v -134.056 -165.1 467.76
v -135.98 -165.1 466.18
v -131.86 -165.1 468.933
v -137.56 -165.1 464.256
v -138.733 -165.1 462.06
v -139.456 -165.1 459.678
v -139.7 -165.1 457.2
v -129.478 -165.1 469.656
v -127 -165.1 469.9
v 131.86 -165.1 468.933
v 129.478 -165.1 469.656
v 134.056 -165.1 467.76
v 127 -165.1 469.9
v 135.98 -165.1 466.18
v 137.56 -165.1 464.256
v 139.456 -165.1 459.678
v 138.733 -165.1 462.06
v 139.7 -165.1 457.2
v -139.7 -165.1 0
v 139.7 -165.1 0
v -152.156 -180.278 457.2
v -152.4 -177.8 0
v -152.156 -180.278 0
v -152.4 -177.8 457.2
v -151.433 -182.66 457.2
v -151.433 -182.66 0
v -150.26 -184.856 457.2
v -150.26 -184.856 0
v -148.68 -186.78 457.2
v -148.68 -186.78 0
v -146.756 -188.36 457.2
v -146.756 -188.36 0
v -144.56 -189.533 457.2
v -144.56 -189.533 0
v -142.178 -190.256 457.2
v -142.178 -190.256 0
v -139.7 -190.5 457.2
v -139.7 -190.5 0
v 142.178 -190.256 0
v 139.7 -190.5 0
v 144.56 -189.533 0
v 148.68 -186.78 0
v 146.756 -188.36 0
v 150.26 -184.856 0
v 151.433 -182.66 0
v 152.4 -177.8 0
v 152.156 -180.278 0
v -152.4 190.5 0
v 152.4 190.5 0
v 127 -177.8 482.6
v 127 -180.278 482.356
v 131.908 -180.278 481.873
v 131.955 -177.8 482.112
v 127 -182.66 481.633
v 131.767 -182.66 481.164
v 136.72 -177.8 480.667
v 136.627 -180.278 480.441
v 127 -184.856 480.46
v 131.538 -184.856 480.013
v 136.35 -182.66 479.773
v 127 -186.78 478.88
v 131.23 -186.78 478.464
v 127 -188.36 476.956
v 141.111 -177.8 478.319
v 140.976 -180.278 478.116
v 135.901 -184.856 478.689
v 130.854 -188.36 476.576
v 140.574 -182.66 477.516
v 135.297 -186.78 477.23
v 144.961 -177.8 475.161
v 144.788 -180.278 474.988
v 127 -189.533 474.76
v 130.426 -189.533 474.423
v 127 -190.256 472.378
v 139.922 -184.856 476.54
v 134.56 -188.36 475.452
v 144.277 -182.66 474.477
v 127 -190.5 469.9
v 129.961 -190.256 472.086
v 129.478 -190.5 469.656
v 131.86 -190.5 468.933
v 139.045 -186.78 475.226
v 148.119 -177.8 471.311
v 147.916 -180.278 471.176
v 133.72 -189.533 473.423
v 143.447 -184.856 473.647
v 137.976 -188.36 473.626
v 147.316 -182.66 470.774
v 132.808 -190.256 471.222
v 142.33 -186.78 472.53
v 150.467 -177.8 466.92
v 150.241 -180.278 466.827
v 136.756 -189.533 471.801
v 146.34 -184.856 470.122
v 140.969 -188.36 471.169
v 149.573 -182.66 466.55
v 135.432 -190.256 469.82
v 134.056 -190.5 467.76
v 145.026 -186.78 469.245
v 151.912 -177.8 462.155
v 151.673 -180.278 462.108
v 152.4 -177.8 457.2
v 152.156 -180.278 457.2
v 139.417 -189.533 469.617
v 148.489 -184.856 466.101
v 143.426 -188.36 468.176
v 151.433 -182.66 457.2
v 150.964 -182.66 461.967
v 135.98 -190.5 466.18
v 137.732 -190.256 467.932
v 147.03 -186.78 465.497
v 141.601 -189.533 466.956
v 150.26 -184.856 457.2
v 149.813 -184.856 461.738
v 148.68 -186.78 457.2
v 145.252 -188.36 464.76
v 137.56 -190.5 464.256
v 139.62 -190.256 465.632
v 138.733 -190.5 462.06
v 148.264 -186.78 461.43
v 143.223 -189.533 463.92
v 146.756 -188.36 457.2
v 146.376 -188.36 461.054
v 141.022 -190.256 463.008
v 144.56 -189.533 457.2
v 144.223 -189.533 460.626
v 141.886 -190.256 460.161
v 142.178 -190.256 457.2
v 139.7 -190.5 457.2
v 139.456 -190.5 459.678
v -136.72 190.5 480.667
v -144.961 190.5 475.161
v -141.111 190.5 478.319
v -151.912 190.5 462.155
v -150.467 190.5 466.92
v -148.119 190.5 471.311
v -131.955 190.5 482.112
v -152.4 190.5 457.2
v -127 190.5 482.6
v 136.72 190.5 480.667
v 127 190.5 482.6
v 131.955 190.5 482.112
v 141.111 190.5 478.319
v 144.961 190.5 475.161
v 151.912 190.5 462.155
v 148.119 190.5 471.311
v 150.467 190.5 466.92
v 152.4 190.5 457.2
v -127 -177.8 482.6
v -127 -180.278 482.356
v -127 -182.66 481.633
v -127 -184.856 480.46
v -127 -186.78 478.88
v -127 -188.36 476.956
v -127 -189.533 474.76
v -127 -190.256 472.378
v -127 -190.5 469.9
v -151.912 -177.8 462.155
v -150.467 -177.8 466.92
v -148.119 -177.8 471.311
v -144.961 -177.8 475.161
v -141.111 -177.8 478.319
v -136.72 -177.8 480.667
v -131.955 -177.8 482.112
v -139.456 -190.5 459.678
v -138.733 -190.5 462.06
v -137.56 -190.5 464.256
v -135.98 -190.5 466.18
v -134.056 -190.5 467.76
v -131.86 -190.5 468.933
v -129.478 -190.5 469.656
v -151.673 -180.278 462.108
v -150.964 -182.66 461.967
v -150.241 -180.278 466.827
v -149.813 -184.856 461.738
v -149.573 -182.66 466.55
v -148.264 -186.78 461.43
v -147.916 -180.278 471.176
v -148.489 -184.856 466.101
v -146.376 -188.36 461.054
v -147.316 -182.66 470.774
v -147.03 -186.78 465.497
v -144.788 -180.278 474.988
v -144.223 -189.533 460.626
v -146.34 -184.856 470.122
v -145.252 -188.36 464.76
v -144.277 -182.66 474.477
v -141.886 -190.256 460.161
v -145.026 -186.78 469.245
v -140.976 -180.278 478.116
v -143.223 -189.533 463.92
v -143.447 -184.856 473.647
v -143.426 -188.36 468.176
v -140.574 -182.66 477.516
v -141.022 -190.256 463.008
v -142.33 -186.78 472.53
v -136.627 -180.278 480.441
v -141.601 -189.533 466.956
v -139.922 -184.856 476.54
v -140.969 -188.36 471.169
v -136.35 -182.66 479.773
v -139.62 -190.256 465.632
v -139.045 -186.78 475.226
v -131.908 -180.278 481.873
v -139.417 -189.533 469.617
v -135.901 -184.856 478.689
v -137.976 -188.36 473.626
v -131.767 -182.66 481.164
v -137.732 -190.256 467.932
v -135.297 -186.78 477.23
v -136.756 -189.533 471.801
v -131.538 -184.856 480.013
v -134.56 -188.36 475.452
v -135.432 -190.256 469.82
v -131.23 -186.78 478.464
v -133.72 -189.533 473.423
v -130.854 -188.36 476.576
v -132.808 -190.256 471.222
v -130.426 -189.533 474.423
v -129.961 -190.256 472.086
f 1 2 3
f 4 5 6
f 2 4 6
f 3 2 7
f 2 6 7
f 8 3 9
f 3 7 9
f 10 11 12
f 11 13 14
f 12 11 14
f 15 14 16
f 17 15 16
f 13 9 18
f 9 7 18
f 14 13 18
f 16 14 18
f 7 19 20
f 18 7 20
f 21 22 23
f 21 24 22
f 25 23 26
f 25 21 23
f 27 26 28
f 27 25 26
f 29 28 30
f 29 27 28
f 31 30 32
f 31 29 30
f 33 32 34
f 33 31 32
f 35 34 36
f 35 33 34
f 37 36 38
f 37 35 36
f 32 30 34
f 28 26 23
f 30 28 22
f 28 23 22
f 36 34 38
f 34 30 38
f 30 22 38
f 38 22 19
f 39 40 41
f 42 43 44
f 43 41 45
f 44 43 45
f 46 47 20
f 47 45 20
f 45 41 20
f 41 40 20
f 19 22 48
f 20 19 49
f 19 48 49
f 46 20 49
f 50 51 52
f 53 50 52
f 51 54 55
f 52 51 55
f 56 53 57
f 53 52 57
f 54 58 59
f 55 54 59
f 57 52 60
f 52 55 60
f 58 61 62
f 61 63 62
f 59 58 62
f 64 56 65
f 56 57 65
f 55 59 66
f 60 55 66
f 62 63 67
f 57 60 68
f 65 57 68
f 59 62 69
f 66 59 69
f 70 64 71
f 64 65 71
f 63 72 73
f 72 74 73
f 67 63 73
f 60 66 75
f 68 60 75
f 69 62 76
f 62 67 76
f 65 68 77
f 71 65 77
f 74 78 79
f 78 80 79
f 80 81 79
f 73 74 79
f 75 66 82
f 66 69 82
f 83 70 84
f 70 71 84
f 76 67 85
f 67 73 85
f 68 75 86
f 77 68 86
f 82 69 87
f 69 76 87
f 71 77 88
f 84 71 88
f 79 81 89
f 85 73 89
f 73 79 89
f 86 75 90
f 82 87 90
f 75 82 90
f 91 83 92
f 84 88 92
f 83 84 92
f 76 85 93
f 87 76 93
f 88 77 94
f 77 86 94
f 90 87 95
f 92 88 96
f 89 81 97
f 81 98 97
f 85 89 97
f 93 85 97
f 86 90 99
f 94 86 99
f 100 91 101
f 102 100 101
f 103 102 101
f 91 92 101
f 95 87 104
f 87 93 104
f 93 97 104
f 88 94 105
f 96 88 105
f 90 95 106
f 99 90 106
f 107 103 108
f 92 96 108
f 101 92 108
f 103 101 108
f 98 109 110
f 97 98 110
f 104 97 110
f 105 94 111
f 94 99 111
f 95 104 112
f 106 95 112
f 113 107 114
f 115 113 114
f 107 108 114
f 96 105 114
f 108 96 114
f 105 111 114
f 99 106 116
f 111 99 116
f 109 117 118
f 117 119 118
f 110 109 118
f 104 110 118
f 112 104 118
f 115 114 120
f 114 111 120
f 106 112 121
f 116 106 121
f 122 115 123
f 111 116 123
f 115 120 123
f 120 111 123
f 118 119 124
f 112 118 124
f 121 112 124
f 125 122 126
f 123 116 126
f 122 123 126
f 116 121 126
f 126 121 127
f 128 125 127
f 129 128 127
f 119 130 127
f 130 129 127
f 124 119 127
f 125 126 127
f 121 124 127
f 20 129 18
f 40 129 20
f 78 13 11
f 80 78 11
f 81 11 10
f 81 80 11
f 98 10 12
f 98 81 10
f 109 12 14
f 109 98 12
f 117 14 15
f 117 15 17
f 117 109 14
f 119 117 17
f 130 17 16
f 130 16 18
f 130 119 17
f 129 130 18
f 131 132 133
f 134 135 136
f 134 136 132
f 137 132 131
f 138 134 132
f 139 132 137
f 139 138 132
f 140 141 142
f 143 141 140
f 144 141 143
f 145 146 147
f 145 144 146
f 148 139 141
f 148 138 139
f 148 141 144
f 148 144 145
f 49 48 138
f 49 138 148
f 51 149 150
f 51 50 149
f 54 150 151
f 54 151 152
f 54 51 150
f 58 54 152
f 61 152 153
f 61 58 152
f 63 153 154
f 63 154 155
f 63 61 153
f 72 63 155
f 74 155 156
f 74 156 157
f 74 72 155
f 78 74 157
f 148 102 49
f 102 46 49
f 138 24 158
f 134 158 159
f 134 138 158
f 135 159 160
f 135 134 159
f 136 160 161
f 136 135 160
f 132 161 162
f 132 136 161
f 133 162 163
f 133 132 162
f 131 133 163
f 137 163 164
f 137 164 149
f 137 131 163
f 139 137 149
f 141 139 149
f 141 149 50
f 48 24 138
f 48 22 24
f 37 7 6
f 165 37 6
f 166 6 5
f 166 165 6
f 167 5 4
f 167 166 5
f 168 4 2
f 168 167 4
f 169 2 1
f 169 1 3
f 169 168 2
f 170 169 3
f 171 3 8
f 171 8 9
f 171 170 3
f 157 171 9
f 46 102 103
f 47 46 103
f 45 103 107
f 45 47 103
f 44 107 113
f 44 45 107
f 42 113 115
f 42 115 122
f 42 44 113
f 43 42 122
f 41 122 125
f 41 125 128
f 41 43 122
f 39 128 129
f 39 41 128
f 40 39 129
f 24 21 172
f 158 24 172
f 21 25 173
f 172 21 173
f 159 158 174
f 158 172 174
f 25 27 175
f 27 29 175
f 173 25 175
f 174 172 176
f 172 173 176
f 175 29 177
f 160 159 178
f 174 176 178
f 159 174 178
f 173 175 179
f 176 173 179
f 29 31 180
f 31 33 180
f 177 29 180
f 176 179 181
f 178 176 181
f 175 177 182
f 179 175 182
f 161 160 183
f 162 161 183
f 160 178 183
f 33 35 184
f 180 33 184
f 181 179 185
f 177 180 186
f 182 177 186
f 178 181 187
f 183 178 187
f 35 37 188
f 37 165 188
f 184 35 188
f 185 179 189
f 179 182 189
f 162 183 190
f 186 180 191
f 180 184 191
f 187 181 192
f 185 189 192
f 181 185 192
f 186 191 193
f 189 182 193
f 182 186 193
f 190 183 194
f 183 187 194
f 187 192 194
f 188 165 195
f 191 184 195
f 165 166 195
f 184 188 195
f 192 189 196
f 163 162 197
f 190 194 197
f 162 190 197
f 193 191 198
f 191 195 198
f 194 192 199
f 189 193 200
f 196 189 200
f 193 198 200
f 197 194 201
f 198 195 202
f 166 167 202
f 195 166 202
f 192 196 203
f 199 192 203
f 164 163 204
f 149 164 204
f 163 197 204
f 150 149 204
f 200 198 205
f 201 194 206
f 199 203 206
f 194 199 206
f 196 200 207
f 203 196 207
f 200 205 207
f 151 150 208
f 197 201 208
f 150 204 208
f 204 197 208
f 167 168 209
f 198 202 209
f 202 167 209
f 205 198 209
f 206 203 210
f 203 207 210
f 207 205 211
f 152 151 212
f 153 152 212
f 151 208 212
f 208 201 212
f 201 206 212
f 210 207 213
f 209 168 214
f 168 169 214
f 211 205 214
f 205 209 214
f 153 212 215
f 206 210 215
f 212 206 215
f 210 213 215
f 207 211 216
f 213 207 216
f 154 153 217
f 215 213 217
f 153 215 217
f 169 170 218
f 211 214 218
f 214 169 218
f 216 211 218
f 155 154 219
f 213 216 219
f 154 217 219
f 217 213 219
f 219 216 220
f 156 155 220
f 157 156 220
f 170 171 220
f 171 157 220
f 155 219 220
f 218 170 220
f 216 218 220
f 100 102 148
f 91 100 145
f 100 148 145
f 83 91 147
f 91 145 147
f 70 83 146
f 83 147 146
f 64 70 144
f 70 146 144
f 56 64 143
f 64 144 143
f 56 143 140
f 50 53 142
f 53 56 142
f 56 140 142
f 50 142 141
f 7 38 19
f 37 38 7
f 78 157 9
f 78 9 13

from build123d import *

# Parameters (mm, degrees)
F0_W     = 304.8
F0_H     = 381
F1_DEPTH = 482.6
F2_R     = 25.4
F3_R     = 12.7
F4_DEPTH = 25.4


# Not quite as in the source:
# - the program builds the solid bodies; features that only make, move or delete a surface that nothing else refers to are left out


with BuildPart() as f1:
    # F0 (on Top) → F1 (new body)
    with BuildSketch(Plane.XY):
        Rectangle(F0_W, F0_H)
    extrude(amount=F1_DEPTH)

    # F2
    f2_edges = [f1.edges().sort_by_distance(p)[0] for p in [
        (-152.4, 0, 482.6),
        (152.4, 0, 482.6),
    ]]
    fillet(f2_edges, radius=F2_R)

    # F3
    f3_edges = [f1.edges().sort_by_distance(p)[0] for p in [
        (-152.4, -190.5, 228.6),
        (-144.960512, -190.5, 475.160512),
        (0, -190.5, 482.6),
        (144.960512, -190.5, 475.160512),
        (152.4, -190.5, 228.6),
    ]]
    fillet(f3_edges, radius=F3_R)

    # F4 (cut): a face of the model
    f4_faces = [f1.faces().sort_by_distance(p)[0] for p in [
        (0, -190.5, 234.8275474118),
    ]]
    extrude(f4_faces, amount=-F4_DEPTH, mode=Mode.SUBTRACT)


solid = f1.part
